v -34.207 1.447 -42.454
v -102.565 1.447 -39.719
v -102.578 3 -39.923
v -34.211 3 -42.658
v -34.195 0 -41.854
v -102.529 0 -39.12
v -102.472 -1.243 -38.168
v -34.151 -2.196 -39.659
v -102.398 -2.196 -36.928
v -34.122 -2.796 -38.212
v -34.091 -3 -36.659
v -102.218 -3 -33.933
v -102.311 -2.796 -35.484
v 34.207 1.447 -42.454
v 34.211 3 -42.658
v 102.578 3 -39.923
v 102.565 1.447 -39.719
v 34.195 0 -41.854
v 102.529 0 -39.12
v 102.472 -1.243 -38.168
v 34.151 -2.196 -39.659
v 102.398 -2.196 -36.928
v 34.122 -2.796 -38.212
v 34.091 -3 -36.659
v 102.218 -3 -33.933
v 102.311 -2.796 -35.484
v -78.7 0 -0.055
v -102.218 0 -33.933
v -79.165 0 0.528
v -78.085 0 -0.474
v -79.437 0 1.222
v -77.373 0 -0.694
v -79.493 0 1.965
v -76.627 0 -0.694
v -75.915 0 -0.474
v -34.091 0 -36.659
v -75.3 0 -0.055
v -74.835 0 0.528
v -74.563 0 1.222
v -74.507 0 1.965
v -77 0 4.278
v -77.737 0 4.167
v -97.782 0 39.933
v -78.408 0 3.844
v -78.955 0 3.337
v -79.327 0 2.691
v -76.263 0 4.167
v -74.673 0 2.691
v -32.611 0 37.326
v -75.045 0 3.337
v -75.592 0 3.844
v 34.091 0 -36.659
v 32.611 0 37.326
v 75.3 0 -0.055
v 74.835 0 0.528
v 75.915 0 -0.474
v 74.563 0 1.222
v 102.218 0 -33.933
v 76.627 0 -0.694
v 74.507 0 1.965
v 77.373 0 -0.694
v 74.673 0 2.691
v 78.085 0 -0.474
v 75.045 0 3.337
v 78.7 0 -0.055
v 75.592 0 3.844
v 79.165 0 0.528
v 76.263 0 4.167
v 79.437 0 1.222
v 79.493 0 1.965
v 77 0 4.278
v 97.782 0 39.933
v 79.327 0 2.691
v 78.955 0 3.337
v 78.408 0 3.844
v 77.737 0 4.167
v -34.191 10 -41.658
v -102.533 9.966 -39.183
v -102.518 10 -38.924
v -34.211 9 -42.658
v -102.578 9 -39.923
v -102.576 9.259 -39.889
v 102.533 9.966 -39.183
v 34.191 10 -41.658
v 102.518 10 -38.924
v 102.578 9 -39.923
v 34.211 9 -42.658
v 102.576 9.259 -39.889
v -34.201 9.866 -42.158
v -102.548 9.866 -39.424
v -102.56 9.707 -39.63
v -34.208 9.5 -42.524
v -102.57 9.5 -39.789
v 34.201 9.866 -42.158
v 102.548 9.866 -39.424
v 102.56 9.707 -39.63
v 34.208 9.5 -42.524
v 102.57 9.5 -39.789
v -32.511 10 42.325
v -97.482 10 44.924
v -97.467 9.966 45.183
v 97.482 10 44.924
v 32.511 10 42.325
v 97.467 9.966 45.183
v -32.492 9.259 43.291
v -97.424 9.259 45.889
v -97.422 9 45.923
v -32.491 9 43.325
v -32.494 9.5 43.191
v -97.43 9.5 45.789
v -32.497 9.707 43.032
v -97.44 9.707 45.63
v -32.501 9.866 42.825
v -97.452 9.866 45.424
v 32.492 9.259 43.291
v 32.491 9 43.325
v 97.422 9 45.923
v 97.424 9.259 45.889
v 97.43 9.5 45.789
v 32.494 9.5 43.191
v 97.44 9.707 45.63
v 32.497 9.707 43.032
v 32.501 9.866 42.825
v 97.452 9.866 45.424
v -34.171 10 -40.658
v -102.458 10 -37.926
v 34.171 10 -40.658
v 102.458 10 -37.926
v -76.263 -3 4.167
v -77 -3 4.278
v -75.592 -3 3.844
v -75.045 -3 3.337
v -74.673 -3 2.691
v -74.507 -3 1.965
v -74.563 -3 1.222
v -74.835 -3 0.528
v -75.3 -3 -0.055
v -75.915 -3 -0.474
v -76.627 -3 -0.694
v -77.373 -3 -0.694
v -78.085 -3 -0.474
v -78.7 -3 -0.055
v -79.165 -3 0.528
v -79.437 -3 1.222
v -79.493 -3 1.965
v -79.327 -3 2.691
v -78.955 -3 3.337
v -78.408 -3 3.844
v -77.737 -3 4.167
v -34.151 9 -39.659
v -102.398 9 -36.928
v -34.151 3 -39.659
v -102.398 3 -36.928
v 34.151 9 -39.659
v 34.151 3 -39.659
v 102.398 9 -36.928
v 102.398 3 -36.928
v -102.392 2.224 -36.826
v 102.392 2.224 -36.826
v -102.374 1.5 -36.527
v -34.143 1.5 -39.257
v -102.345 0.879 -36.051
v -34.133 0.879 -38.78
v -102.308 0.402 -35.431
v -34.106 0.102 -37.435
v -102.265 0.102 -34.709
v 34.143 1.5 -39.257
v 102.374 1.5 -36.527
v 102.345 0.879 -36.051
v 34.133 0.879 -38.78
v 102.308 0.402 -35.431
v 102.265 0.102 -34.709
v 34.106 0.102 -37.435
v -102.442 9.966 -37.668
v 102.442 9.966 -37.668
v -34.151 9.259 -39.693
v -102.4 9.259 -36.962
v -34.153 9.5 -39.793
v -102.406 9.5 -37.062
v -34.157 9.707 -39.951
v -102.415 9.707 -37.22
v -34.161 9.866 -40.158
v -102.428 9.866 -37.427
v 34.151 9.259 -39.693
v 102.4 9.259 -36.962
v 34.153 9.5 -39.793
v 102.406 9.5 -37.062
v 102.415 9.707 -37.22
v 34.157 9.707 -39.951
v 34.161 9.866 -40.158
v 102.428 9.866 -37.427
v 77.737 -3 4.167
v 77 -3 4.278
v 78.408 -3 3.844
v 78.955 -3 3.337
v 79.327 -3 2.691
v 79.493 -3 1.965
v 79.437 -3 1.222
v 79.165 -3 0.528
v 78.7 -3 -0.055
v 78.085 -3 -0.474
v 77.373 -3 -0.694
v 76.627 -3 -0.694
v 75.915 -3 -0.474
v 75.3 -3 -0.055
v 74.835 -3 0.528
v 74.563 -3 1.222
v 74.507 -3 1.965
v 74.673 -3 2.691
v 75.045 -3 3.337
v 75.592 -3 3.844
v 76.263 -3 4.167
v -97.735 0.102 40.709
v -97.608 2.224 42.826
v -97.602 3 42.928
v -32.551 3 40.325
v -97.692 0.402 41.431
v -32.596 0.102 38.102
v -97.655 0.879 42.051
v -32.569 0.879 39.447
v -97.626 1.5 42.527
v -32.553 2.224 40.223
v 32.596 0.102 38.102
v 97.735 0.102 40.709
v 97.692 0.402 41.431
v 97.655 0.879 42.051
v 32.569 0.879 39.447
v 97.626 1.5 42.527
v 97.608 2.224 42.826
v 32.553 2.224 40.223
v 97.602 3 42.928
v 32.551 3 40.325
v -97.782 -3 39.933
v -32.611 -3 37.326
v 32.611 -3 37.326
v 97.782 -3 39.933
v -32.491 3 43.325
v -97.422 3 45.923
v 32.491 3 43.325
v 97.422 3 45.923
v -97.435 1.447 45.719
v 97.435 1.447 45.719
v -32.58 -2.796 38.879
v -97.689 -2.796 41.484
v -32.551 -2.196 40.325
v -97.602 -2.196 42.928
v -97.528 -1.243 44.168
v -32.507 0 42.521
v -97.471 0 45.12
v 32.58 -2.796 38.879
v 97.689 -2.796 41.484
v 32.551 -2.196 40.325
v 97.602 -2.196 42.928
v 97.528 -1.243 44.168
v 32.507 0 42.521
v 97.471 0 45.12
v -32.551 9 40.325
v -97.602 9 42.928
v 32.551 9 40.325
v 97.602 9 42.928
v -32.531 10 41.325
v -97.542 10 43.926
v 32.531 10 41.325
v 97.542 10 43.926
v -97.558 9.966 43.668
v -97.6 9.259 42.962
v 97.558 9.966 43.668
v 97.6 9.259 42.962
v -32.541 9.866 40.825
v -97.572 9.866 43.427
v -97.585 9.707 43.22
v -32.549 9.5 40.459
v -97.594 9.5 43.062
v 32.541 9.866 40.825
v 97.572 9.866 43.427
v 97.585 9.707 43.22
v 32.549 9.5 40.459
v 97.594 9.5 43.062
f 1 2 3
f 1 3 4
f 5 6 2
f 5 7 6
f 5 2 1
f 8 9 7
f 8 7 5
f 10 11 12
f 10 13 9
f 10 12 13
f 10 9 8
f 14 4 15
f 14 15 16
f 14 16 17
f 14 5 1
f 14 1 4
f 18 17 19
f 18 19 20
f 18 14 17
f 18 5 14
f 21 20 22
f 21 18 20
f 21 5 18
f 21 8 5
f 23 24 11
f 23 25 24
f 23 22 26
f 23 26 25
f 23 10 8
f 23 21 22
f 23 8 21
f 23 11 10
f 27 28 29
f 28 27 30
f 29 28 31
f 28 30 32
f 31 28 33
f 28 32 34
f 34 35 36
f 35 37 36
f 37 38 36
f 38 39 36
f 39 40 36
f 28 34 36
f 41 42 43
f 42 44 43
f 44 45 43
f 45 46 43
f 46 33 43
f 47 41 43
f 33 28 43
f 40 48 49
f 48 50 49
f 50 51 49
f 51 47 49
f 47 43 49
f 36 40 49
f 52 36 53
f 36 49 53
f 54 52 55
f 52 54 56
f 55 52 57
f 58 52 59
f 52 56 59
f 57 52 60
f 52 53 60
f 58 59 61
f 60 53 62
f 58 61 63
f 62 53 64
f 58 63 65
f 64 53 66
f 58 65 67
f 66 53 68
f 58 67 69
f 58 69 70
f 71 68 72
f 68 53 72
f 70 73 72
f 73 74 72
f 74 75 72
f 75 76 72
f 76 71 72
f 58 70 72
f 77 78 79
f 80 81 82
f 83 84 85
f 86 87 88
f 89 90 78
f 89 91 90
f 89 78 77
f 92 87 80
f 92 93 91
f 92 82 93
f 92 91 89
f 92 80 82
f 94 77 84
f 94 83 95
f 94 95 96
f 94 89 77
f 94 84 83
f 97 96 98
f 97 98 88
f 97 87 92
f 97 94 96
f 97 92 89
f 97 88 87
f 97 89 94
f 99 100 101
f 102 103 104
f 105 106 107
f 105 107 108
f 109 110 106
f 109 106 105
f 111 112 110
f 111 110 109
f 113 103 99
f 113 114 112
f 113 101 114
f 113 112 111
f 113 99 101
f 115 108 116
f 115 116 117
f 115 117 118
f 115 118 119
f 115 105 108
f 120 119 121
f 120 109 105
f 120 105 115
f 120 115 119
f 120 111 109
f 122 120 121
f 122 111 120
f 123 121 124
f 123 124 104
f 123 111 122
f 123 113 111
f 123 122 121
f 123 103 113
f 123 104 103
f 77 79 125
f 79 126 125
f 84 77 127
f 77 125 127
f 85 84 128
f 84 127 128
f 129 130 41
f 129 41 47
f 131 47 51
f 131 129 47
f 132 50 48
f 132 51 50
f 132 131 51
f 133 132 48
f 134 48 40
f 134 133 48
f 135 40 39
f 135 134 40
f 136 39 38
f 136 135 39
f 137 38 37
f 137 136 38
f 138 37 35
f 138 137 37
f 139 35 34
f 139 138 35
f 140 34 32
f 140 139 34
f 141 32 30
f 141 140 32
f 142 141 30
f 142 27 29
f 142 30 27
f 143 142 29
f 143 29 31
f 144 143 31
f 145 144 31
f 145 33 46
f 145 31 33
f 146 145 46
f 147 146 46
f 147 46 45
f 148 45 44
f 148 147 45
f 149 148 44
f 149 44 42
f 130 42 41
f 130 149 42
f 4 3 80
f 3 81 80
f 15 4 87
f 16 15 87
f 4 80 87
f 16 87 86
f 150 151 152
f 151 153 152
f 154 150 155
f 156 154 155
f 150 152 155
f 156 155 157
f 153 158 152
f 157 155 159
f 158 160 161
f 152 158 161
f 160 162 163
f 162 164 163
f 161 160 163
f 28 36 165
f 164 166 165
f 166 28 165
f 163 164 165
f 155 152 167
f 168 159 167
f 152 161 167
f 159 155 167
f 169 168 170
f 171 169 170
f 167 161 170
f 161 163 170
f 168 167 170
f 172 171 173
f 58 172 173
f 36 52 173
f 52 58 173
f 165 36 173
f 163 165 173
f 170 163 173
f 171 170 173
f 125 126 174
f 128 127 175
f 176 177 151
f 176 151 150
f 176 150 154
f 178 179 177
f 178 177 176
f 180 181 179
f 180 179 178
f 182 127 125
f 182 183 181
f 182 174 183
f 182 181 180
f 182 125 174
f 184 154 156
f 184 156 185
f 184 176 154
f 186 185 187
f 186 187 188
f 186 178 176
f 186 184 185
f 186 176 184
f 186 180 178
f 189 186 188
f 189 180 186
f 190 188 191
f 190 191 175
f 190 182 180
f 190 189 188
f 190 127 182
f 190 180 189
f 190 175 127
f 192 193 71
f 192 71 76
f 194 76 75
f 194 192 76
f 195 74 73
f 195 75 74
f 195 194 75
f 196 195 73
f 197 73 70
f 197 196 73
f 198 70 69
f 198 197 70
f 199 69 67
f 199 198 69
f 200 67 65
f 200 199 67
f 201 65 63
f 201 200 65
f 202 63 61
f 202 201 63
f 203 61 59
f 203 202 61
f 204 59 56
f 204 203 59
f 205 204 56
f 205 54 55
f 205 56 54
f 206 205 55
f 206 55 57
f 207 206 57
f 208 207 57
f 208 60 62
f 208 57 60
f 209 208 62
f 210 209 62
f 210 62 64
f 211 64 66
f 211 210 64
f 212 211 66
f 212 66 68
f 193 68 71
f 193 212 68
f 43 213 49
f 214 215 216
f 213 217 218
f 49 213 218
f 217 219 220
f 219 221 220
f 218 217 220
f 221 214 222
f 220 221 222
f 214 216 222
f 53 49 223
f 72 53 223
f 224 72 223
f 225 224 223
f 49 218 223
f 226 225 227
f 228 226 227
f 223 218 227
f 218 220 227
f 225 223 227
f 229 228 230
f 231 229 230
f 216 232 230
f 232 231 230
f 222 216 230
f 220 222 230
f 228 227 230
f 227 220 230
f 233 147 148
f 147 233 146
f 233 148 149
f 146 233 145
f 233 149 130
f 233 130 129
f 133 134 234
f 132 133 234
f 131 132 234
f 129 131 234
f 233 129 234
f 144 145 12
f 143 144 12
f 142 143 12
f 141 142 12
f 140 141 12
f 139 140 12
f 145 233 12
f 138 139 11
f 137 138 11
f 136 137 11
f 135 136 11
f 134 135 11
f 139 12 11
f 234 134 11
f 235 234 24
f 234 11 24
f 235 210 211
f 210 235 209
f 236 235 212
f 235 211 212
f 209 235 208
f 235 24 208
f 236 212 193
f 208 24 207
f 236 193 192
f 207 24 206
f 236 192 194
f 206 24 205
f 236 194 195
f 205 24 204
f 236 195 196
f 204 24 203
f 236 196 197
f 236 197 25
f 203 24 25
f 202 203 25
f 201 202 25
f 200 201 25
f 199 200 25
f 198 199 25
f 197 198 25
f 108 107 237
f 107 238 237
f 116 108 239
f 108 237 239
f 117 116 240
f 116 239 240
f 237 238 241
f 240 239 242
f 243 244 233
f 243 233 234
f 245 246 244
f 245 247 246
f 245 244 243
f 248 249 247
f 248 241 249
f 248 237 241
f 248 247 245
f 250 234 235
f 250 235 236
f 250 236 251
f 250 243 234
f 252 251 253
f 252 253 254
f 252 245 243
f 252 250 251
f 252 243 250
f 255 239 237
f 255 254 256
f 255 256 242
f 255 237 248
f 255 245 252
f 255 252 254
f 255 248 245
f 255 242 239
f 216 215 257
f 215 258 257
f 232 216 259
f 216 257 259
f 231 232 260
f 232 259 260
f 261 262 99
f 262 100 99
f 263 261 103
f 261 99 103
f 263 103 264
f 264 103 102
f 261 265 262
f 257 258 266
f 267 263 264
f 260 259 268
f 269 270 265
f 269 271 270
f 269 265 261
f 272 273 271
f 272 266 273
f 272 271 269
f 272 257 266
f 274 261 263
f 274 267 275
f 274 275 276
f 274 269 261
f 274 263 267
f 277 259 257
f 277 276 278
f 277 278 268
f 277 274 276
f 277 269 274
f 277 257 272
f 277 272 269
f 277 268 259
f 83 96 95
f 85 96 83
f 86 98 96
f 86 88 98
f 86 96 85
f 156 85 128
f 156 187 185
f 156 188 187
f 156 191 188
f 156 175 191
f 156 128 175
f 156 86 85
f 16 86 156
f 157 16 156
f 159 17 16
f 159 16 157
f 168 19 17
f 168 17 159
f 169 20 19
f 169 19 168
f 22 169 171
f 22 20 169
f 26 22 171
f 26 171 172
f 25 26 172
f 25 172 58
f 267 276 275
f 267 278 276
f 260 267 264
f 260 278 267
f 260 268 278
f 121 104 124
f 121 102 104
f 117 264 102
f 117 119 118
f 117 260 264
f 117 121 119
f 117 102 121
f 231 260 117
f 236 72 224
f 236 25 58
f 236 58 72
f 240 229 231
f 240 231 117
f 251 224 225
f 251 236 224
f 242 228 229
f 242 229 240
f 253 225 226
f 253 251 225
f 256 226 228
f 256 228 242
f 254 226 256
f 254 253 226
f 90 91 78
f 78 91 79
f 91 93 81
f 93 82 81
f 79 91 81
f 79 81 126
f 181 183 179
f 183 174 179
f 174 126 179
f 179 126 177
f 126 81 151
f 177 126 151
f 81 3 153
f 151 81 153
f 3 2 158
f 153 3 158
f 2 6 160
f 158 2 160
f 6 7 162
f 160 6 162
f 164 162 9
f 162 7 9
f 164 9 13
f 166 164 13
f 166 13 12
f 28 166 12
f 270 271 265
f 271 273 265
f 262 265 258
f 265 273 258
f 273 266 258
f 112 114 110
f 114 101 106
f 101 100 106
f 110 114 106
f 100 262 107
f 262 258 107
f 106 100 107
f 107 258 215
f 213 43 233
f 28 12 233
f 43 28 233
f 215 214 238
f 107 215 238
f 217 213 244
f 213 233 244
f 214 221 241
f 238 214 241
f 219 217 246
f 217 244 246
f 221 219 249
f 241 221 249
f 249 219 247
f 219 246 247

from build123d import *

# Parameters (mm, degrees)
RETAINING_SCREW_HOLES_DEPTH      = 113.83205248
RETAINING_SCREW_HOLES_DEPTH_BACK = 113.83205248
SKETCH3_R                        = 2.5


with BuildPart() as part:
    # Ceiling structural member cradle: sweep along a path in Sketch2
    with BuildLine(Plane(origin=(0, 0, 0), x_dir=(1, 0, 0), z_dir=(0, 1, 0))) as ceiling_structural_member_cradle_path:
        ThreePointArc((-100, -3), (0, 0), (100, -3))
    # Sketch1 → Ceiling structural member cradle (sweep)
    with BuildSketch(Plane(origin=(0, 0, 0), x_dir=(0, 0, -1), z_dir=(1, 0, 0))):
        with BuildLine():
            Line((0, 0), (-37, 0))
            ThreePointArc((-37, 0), (-39.121320344, 0.878679656), (-40, 3))
            Line((-40, 3), (-40, 9))
            ThreePointArc((-40, 9), (-40.292893219, 9.707106781), (-41, 10))
            Line((-41, 10), (-42, 10))
            ThreePointArc((-42, 10), (-42.707106781, 9.707106781), (-43, 9))
            Line((-43, 9), (-43, 3))
            ThreePointArc((-43, 3), (-41.242640687, -1.242640687), (-37, -3))
            Line((-37, -3), (37, -3))
            ThreePointArc((37, -3), (41.242640687, -1.242640687), (43, 3))
            Line((43, 3), (43, 9))
            ThreePointArc((43, 9), (42.707106781, 9.707106781), (42, 10))
            Line((42, 10), (41, 10))
            ThreePointArc((41, 10), (40.292893219, 9.707106781), (40, 9))
            Line((40, 9), (40, 3))
            ThreePointArc((40, 3), (39.121320344, 0.878679656), (37, 0))
            Line((37, 0), (0, 0))
        make_face()
    sweep(path=ceiling_structural_member_cradle_path.line)

    # Sketch3 → Retaining screw holes (cut, two sides: drawn at the far end of the back side and taken through both)
    with BuildSketch(Plane(origin=(0, 0, 0), x_dir=(1, 0, 0), z_dir=(0, 1, 0)).offset(-RETAINING_SCREW_HOLES_DEPTH_BACK)):
        with Locations(Location((-77, -1.778048193, 0), (0, 0, 270))):
            Circle(SKETCH3_R)
        with Locations(Location((77, -1.778048193, 0), (0, 0, 270))):
            Circle(SKETCH3_R)
    extrude(amount=RETAINING_SCREW_HOLES_DEPTH + RETAINING_SCREW_HOLES_DEPTH_BACK, mode=Mode.SUBTRACT)


solid = part.part
